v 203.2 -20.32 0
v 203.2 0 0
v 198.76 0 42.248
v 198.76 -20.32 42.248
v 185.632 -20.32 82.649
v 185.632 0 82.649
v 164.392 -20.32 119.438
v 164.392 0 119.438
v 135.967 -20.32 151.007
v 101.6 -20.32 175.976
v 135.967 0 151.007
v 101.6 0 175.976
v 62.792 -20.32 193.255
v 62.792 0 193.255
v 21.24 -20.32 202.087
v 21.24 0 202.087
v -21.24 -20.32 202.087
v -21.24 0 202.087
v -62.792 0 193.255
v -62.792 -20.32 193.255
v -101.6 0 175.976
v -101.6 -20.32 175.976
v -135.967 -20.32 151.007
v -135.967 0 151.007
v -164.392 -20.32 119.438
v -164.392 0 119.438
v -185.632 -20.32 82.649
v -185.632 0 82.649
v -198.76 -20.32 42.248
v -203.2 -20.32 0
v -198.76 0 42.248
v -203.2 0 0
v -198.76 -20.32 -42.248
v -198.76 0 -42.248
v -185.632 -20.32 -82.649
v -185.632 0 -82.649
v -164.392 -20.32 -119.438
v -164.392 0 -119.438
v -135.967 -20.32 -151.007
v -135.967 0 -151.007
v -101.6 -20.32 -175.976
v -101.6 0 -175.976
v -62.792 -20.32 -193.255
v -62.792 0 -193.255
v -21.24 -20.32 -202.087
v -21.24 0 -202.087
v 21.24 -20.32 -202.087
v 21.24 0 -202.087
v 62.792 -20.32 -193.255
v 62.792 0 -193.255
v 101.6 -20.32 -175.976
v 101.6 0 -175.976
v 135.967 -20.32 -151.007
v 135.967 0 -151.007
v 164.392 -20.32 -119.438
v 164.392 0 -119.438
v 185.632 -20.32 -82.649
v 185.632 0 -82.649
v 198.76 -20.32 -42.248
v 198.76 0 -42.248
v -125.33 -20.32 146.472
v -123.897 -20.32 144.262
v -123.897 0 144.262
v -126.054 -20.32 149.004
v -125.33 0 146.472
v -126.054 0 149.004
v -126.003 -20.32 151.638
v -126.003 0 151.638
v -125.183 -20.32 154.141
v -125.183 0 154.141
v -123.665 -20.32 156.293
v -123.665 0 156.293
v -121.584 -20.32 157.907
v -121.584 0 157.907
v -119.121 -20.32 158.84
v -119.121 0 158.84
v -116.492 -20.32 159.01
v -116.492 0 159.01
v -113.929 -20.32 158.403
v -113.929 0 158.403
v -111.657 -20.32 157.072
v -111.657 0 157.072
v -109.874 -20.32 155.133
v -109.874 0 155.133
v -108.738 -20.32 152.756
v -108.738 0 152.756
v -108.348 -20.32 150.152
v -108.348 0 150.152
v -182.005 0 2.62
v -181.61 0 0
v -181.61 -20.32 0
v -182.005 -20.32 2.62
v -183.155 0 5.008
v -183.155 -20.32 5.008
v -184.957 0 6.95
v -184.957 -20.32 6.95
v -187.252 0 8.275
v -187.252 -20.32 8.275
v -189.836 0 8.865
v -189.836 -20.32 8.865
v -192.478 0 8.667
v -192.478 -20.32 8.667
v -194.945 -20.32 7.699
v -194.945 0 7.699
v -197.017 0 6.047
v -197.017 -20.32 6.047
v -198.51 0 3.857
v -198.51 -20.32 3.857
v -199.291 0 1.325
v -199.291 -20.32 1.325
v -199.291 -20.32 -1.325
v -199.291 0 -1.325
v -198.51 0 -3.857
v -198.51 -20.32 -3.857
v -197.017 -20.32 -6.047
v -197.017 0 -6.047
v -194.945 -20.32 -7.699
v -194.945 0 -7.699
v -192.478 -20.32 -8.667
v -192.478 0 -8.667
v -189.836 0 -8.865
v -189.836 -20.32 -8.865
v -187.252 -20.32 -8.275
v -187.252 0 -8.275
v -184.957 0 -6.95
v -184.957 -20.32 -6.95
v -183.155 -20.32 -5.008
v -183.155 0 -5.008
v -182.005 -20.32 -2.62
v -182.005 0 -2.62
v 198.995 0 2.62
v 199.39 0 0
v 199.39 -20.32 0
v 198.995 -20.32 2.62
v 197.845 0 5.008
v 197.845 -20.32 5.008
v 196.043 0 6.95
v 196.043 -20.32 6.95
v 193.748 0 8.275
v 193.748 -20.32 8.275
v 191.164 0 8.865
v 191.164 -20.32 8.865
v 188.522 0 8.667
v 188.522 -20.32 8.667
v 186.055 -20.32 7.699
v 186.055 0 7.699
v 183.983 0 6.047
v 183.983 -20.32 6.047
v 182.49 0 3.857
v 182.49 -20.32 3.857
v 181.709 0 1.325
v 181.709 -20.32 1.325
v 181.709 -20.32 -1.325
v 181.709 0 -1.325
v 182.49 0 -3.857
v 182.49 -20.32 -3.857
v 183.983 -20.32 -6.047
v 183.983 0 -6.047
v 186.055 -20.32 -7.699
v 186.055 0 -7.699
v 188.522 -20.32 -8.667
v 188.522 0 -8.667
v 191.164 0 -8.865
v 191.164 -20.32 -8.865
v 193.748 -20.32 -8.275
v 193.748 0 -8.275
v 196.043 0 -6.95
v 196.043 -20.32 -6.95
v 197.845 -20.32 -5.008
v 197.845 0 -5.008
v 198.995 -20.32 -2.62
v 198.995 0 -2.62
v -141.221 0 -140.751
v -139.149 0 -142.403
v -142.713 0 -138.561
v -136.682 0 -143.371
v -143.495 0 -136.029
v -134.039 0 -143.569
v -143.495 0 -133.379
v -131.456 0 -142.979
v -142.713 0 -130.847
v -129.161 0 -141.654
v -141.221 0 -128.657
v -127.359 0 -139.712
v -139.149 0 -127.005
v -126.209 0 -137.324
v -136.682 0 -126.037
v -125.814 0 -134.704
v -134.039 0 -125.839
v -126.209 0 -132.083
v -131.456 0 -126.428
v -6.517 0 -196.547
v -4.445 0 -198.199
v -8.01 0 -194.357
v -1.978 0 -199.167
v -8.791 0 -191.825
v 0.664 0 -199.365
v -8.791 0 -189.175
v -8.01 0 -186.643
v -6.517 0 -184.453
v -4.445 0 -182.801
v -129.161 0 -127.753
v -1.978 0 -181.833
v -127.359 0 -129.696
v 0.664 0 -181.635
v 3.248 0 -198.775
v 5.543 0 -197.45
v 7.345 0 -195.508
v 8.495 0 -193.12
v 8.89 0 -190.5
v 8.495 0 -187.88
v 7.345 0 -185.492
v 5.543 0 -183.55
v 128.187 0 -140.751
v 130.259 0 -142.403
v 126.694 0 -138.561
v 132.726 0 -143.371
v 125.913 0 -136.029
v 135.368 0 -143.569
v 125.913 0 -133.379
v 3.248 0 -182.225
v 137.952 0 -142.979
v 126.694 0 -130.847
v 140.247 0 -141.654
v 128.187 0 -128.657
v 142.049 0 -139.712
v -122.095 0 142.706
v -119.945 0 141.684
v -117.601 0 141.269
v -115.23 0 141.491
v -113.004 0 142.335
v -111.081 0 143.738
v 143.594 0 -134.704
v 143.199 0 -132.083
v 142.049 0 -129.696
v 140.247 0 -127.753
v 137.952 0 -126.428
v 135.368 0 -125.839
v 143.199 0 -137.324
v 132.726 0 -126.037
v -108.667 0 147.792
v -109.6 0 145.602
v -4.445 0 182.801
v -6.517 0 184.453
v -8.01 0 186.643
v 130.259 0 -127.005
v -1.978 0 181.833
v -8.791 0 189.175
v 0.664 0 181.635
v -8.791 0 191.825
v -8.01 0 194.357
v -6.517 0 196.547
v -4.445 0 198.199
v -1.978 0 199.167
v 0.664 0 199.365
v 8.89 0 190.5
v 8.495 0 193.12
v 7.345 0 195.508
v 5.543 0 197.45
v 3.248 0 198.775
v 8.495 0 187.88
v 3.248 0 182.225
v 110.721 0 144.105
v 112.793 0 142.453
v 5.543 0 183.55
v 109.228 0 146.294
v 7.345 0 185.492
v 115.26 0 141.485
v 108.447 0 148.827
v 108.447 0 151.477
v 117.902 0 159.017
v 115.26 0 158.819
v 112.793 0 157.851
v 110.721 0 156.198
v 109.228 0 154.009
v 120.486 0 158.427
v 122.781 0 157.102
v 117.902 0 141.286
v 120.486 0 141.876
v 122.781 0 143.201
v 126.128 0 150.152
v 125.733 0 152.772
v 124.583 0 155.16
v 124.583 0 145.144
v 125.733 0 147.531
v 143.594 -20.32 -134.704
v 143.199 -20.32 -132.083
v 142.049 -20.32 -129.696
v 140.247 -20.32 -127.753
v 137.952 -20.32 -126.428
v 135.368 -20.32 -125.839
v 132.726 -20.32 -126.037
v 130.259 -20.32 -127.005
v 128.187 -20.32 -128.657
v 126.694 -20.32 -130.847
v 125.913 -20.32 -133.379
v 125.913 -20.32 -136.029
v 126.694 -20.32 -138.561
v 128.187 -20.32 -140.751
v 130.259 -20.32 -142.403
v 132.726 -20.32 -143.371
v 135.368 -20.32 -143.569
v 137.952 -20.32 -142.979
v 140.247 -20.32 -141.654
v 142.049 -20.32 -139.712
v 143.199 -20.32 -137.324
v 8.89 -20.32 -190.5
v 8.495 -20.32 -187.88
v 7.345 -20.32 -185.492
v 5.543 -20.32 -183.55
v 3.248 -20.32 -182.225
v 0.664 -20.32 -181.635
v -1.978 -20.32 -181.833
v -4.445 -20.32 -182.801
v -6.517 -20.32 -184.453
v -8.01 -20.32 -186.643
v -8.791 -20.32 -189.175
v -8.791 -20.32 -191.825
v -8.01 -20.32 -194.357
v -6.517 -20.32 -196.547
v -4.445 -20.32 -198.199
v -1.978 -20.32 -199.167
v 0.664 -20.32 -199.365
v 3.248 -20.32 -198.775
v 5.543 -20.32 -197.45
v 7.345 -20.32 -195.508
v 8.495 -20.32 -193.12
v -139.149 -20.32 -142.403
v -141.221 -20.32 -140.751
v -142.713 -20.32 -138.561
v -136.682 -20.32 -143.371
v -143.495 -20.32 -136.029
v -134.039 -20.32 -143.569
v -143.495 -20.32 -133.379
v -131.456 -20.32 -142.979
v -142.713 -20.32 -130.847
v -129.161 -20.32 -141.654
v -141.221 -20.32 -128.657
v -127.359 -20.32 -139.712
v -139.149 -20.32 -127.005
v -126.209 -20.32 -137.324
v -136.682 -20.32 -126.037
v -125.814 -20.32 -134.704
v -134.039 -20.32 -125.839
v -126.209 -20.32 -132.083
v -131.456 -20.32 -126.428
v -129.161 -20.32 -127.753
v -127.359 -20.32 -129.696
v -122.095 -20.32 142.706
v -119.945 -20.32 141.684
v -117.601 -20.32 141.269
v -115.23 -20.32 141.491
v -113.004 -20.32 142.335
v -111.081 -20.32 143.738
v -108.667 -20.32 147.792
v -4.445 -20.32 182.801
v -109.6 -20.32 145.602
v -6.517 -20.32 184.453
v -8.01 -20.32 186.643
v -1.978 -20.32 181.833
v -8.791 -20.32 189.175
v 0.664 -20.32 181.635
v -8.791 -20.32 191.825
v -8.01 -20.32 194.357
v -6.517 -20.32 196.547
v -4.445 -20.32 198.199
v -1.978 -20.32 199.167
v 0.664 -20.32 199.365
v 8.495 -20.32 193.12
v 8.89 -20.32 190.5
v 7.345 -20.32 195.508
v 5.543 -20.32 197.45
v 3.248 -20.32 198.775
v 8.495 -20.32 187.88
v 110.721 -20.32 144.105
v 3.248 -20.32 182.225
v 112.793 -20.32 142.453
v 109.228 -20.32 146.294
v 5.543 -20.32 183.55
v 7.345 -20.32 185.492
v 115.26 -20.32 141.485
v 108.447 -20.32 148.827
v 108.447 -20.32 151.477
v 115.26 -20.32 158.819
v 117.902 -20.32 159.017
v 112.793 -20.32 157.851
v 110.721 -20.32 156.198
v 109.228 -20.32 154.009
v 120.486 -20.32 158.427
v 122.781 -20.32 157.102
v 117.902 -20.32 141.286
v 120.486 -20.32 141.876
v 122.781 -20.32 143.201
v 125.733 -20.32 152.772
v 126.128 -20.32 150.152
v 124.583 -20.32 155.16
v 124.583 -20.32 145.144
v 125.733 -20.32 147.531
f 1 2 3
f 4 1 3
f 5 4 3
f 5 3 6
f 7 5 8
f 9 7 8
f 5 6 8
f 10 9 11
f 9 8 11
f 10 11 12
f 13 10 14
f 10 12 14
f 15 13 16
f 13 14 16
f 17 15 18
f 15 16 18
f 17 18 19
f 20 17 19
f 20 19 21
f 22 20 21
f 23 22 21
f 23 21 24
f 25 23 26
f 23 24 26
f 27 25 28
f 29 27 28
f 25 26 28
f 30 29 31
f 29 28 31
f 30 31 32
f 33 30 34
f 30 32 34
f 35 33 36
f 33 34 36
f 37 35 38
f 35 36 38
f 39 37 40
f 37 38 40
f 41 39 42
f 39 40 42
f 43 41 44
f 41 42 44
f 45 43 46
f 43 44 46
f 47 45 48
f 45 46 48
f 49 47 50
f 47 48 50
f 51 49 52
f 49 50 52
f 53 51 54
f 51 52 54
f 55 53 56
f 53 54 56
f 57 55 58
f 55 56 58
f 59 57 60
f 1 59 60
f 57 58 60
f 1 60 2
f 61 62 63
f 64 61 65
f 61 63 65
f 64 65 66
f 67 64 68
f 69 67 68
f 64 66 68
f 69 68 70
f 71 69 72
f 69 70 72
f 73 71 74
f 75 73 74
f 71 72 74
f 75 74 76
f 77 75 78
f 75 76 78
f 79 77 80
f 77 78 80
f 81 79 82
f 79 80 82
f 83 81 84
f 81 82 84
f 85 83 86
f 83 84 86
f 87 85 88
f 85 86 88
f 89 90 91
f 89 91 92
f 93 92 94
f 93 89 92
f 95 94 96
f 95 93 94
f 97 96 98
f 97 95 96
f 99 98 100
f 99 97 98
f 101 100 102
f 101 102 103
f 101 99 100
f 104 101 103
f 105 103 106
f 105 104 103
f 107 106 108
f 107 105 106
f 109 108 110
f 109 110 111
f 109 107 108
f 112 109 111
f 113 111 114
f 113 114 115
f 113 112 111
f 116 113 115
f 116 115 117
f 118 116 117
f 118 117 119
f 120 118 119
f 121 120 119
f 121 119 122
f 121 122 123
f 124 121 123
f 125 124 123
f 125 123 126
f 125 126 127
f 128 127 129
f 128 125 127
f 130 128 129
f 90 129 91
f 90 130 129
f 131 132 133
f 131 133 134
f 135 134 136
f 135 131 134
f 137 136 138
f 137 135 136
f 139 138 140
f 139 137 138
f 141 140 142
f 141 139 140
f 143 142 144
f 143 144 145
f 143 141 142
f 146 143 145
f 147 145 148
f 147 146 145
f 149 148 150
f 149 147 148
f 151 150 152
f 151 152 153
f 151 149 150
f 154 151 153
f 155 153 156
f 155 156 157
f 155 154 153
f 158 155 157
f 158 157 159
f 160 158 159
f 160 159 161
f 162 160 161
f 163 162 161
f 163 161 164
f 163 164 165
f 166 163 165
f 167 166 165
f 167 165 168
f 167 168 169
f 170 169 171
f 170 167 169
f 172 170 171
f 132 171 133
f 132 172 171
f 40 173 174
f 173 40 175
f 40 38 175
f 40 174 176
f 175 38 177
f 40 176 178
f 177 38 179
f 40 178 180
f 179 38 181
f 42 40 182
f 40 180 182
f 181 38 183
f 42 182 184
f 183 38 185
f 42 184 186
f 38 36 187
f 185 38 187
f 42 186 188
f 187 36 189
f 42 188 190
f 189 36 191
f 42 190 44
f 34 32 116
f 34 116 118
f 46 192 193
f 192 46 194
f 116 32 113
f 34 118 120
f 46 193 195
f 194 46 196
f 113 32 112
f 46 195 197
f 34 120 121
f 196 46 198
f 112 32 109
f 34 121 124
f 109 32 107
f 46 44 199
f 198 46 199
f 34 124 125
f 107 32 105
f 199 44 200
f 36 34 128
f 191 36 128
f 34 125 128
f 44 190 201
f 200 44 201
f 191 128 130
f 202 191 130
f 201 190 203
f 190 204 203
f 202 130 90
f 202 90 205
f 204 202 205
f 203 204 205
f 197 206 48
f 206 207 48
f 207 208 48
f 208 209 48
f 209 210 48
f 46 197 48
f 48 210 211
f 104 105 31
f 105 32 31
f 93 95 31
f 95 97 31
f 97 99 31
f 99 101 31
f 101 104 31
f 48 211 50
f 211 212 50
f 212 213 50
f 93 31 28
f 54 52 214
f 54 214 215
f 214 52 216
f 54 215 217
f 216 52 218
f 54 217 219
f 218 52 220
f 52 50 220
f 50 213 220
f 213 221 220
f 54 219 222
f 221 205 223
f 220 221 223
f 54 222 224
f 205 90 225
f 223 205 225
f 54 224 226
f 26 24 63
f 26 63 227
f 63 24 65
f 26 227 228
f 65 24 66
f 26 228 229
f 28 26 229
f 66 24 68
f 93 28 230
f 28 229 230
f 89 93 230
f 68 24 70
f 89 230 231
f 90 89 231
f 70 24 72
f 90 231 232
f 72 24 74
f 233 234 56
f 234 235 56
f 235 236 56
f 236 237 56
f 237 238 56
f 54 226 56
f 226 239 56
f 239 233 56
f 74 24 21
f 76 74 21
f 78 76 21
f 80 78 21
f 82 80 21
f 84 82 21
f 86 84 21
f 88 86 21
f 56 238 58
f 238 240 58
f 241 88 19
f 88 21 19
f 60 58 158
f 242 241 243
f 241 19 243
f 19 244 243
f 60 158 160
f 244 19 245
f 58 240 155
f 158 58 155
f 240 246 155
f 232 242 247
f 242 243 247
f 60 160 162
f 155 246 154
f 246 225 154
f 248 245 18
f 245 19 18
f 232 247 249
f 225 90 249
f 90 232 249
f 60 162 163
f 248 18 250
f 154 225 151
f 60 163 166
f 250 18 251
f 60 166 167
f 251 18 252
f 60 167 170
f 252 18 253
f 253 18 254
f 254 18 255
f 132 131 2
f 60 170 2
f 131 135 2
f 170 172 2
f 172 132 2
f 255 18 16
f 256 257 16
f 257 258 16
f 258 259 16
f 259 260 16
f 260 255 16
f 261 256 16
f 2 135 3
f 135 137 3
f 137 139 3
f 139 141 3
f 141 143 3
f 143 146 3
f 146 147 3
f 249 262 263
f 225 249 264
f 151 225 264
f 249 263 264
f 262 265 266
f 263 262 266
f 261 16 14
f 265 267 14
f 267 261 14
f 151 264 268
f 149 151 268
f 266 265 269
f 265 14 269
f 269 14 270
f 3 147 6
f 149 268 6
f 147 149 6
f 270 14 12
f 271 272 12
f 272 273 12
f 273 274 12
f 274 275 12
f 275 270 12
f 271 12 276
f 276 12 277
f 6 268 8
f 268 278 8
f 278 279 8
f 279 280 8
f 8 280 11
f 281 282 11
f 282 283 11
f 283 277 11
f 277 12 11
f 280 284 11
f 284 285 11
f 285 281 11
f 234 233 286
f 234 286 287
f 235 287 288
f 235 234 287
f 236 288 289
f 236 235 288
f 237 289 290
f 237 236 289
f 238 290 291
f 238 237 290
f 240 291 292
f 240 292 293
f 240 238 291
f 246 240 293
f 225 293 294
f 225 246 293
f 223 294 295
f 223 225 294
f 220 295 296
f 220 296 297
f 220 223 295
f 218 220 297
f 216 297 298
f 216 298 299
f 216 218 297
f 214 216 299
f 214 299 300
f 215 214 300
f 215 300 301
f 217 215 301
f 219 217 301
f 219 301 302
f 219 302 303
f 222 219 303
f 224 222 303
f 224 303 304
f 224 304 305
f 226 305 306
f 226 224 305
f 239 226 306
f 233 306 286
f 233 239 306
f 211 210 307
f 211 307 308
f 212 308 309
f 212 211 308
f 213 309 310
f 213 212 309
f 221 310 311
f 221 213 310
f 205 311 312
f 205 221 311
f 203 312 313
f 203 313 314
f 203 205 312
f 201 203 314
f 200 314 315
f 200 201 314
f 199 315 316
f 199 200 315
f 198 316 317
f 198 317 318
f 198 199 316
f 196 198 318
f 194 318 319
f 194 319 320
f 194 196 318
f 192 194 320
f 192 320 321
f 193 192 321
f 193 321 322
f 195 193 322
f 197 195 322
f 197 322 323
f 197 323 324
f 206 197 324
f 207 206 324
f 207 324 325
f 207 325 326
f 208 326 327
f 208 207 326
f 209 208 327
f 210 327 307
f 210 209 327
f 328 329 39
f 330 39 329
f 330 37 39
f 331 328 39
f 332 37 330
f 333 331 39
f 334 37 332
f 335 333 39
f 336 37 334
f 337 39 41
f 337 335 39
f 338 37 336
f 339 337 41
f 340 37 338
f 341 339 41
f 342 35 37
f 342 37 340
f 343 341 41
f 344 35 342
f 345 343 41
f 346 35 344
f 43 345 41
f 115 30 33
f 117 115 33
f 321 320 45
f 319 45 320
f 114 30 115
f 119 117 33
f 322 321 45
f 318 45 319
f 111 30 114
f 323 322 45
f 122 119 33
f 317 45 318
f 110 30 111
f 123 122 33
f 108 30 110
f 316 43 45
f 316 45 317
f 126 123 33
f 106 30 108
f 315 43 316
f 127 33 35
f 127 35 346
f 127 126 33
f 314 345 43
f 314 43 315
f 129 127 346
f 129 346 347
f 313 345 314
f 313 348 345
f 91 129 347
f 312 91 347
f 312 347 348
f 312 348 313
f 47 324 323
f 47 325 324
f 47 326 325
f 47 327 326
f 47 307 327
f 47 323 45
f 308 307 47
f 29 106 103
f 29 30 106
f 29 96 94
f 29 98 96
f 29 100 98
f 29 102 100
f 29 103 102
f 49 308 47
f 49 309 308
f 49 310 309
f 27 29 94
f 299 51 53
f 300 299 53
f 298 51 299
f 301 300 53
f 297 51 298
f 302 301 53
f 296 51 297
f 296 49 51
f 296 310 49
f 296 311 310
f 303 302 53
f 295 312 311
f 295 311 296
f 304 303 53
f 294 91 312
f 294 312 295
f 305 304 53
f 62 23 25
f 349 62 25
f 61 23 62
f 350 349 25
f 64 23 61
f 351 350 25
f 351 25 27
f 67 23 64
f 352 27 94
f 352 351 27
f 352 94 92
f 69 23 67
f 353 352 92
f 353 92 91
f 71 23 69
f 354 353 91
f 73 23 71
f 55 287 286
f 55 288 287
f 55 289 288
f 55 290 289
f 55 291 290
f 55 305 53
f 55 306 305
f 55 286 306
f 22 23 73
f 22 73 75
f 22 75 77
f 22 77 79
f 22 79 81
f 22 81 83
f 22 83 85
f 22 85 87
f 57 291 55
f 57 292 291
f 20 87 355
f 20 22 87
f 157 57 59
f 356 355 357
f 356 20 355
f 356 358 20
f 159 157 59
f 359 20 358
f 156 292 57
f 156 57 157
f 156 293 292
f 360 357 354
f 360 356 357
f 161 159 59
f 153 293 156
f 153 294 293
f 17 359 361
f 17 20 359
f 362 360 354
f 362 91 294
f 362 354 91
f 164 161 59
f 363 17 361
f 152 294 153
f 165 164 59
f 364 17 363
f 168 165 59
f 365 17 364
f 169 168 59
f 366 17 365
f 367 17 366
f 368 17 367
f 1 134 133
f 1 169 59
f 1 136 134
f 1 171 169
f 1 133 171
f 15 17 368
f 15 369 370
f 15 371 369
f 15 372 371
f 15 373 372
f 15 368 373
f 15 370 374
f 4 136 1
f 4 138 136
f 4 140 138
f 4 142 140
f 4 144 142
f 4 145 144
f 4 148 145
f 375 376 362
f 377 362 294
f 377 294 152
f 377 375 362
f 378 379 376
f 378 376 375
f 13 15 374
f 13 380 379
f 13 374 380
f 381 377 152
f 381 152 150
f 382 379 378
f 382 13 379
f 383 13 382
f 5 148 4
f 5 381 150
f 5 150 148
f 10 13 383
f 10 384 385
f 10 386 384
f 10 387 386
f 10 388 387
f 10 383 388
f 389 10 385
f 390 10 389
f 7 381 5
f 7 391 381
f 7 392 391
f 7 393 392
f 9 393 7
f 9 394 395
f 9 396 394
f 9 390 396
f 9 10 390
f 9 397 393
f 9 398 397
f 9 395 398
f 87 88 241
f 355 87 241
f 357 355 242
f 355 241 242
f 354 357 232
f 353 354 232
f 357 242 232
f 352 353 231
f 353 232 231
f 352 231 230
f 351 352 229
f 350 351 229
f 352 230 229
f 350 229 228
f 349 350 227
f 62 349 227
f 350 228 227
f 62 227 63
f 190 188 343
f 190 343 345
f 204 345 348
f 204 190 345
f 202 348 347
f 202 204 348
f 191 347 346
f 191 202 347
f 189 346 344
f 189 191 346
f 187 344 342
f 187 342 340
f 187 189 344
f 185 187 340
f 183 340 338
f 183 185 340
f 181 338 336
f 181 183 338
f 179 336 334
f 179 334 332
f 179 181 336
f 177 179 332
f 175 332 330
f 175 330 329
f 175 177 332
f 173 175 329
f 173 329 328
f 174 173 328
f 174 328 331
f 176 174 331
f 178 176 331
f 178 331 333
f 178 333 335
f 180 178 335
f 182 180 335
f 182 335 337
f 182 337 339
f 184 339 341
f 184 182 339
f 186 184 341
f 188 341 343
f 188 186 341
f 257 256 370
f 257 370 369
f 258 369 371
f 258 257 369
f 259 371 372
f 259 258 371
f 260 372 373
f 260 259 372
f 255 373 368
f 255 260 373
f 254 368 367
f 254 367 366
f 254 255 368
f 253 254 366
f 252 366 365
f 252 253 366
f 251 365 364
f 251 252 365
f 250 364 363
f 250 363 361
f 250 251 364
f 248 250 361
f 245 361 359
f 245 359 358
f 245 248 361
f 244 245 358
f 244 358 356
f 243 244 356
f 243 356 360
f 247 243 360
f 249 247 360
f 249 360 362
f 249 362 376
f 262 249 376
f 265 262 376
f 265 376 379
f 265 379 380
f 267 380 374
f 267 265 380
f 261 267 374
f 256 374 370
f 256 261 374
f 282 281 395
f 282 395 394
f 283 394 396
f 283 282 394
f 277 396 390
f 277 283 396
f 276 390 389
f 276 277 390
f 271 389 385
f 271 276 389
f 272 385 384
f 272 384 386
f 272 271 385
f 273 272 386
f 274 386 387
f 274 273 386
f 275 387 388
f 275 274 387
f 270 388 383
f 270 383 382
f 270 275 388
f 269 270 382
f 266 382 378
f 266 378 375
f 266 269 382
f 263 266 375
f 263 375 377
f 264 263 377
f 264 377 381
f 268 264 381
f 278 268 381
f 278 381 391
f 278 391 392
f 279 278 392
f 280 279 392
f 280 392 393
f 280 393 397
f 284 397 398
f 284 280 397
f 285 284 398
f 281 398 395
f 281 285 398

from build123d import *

# Parameters (mm, degrees)
F0_R     = 203.2
F0_R_2   = 8.89
F1_DEPTH = 20.32


with BuildPart() as f1:
    # F0 (on Front) → F1 (new body)
    with BuildSketch(Plane.XZ):
        Circle(F0_R)
        with Locations((-134.703841816, -134.703841816)):
            Circle(F0_R_2, mode=Mode.SUBTRACT)
        with Locations((0, -190.5)):
            Circle(F0_R_2, mode=Mode.SUBTRACT)
        with Locations((-190.5, 0)):
            Circle(F0_R_2, mode=Mode.SUBTRACT)
        with Locations((134.703841816, -134.703841816)):
            Circle(F0_R_2, mode=Mode.SUBTRACT)
        with Locations((190.5, 0)):
            Circle(F0_R_2, mode=Mode.SUBTRACT)
        with BuildLine():
            ThreePointArc((-123.8970573285, 144.2619540188), (-120.3869637363, 158.4652267944), (-108.347947169, 150.1516358339))
            ThreePointArc((-108.347947169, 150.1516358339), (-114.0889306017, 141.8380448734), (-123.8970573285, 144.2619540188))
        make_face(mode=Mode.SUBTRACT)
        with Locations((0, 190.5)):
            Circle(F0_R_2, mode=Mode.SUBTRACT)
        with Locations((117.237947169, 150.1516358339)):
            Circle(F0_R_2, mode=Mode.SUBTRACT)
    extrude(amount=F1_DEPTH)


solid = f1.part
